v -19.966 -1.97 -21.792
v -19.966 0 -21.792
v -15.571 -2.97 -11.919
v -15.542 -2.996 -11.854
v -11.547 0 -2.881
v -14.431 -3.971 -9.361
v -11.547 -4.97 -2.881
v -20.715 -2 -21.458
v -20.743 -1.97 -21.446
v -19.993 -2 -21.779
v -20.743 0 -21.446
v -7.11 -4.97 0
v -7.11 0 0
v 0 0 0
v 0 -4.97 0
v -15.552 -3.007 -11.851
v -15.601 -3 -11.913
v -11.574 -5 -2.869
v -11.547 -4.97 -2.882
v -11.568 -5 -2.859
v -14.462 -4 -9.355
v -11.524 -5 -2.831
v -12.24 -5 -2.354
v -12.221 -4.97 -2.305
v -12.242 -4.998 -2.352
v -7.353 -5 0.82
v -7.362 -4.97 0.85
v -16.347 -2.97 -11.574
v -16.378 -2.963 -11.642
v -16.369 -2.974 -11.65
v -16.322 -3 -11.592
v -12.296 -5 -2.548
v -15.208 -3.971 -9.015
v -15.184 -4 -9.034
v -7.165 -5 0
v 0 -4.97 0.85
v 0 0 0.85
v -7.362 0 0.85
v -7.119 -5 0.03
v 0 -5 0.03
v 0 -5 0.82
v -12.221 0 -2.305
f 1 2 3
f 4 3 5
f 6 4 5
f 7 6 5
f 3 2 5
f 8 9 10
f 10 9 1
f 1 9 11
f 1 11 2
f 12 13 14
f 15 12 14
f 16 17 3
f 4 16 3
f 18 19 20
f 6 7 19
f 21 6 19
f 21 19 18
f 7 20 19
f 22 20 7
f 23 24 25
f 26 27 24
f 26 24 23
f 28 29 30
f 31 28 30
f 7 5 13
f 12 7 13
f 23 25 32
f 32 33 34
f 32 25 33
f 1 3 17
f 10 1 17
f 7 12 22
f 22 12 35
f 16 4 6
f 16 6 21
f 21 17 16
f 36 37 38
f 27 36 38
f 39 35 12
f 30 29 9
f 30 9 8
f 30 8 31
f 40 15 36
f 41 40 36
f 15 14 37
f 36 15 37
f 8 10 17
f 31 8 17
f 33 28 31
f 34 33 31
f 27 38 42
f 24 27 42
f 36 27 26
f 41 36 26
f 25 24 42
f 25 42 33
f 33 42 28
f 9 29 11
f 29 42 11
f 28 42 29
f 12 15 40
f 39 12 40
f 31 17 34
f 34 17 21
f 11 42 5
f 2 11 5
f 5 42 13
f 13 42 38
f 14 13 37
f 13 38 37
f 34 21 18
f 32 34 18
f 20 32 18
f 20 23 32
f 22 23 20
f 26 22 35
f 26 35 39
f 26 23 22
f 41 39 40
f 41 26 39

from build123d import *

# Parameters (mm, degrees)
F1_DEPTH     = 5
F3_DEPTH     = 25
F4_T1_DEPTH  = 5.9478639207
F4_T6_DEPTH  = 11.0004984696
F4_T11_DEPTH = 3.281815708
F4_T16_DEPTH = 7.2643009793
F4_T21_DEPTH = 5.7529029378
F5_T1_DEPTH  = 7.6329796459
F5_T3_DEPTH  = 7.4610000963
F5_T8_DEPTH  = 7.4842482227
F5_T13_DEPTH = 7.4842482227
F5_T18_DEPTH = 3.281815708
F5_T23_DEPTH = 11.0004984696


# Not quite as in the source:
# - a fillet or chamfer that OpenCascade refuses, or shapes differently, is made with other operations: its cross-section is extruded or revolved along the edge and cut away or added


with BuildPart() as f1:
    # F0 (on Front) → F1 (new body)
    with BuildSketch(Plane.XZ):
        Polygon((-7.11, 0), (0, 0), (0, 0.85), (-7.3617814707, 0.85), (-12.2206721932, -2.3054005297), (-20.7425294551, -21.4458053218), (-19.9660158161, -21.7915314684), (-11.5465673044, -2.8811404952), align=None)
    extrude(amount=F1_DEPTH)

    # F2 (on face) → F3 (cut)
    with BuildSketch(Plane(origin=(-8.5658121179, 0, 3.8137452678), x_dir=(0, 1, 0), z_dir=(0.9135454576, 0, -0.4067366431))):
        Polygon((-4, -14.4284648367), (-5, -7.3284648367), (-5, -28.0284648367), (-2, -28.0284648367), (-3, -17.2284648367), align=None)
    extrude(amount=-F3_DEPTH, mode=Mode.SUBTRACT)

    # F4: chamfer of 0.03 on 5 edges, made by hand

    # F4_s2 → F4_t1 (cut)
    with BuildSketch(Plane(origin=(-4.7250832121, 0, -3.0685049164), x_dir=(0, 1, 0), z_dir=(-0.8386705679, 0, -0.544639035))):
        Polygon((-4.97, -4.722383539), (-5, -4.692383539), (-5, -4.722383539), align=None)
    extrude(amount=F4_T1_DEPTH, mode=Mode.SUBTRACT)


with BuildPart() as f4_tool4:
    # F4_s5 → F4_t6 (new body)
    with BuildSketch(Plane(origin=(-11.2598610976, 2.5632795791, -25.2900620943), x_dir=(0.2219685938, 0.9750538156, 0), z_dir=(0.4050042191, -0.0921982106, 0.9096543698))):
        Polygon((-6.352559346, 8.2598889374), (-6.3880194376, 8.283182325), (-6.3819360855, 8.2538055854), align=None)
    extrude(amount=F4_T6_DEPTH)

    split(bisect_by=Plane(origin=(-0.3055183915, 0.3704168412, 0.2808368777), x_dir=(0.771450463, 0.6362893863, 0), z_dir=(0.549241742, -0.6659120918, -0.5048708694)), keep=Keep.TOP)


with BuildPart() as f1_1:
    add(f1.part)

    # F4_t3: cut F4_tool4
    add(f4_tool4.part, mode=Mode.SUBTRACT)


with BuildPart() as f4_tool9:
    # F4_s10 → F4_t11 (new body)
    with BuildSketch(Plane(origin=(-5.8578101844, 5.1435618144, -13.1568570886), x_dir=(0.659809773, 0.751432674, 0), z_dir=(0.3830409438, -0.336336397, 0.8603240456))):
        Polygon((-12.5057496784, 2.3040031535), (-12.5477702003, 2.3098577021), (-12.5296872137, 2.2859201669), align=None)
    extrude(amount=F4_T11_DEPTH)

    split(bisect_by=Plane(origin=(-2.1159962098, 2.405108563, 1.1858724964), x_dir=(0.7507908153, 0.6605400454, 0), z_dir=(0.6194574075, -0.7040949829, -0.3471639027)), keep=Keep.TOP)


with BuildPart() as f1_2:
    add(f1_1.part)

    # F4_t8: cut F4_tool9
    add(f4_tool9.part, mode=Mode.SUBTRACT)


with BuildPart() as f4_tool14:
    # F4_s15 → F4_t16 (new body)
    with BuildSketch(Plane.YZ.offset(-7.1871504896)):
        Polygon((-4.97, 0), (-5, 0.03), (-5, 0), align=None)
    extrude(amount=F4_T16_DEPTH)

    split(bisect_by=Plane(origin=(0.2989023851, -0.5488082305, -0.4602693104), x_dir=(0.878196468, 0.4783000769, 0), z_dir=(0.385117955, -0.7071067812, -0.5930296458)), keep=Keep.TOP)


with BuildPart() as f1_3:
    add(f1_2.part)

    # F4_t13: cut F4_tool14
    add(f4_tool14.part, mode=Mode.SUBTRACT)


with BuildPart() as f4_tool19:
    # F4_s20 → F4_t21 (new body)
    with BuildSketch(Plane(origin=(-9.7610352954, 0, -6.3388904383), x_dir=(0, 1, 0), z_dir=(0.8386705679, 0, 0.544639035))):
        Polygon((-4.97, 3.872383539), (-5, 3.902383539), (-5, 3.872383539), align=None)
    extrude(amount=F4_T21_DEPTH)

    split(bisect_by=Plane(origin=(-8.5658121179, 0, 3.8137452678), x_dir=(0, 1, 0), z_dir=(0.9135454576, 0, -0.4067366431)), keep=Keep.TOP)

    split(bisect_by=Plane(origin=(0, -2.485, -2.485), x_dir=(1, 0, 0), z_dir=(0, -0.7071067812, -0.7071067812)), keep=Keep.TOP)


with BuildPart() as f1_4:
    add(f1_3.part)

    # F4_t18: cut F4_tool19
    add(f4_tool19.part, mode=Mode.SUBTRACT)

    # F5: chamfer of 0.03 on 5 edges, made by hand

    # F5_s2 → F5_t1 (cut)
    with BuildSketch(Plane(origin=(-5.6229623165, 1.9471236166, -12.6293801411), x_dir=(0.3272176494, 0.9449489986, 0), z_dir=(0.4027614046, -0.1394685218, 0.9046169258))):
        Polygon((-8.7284463039, 7.9822536907), (-8.7481067262, 7.9446575766), (-8.7570745721, 7.9732858448), align=None)
    extrude(amount=F5_T1_DEPTH, mode=Mode.SUBTRACT)

    # F5_s4 → F5_t3 (cut)
    with BuildSketch(Plane.YZ.offset(-7.3838496067)):
        Polygon((-4.97, 0.85), (-5, 0.82), (-5, 0.85), align=None)
    extrude(amount=F5_T3_DEPTH, mode=Mode.SUBTRACT)


with BuildPart() as f5_tool6:
    # F5_s7 → F5_t8 (new body)
    with BuildSketch(Plane(origin=(-5.5630590396, 1.9263802648, -12.4948351783), x_dir=(0.3272176494, 0.9449489986, 0), z_dir=(0.4027614046, -0.1394685218, 0.9046169258))):
        Polygon((-8.4743573363, 7.1711194253), (-8.5119534504, 7.1907798476), (-8.5029856044, 7.1621515794), align=None)
    extrude(amount=F5_T8_DEPTH)

    split(bisect_by=Plane(origin=(0.2989023851, -0.5488082305, -0.4602693104), x_dir=(0.878196468, 0.4783000769, 0), z_dir=(0.385117955, -0.7071067812, -0.5930296458)), keep=Keep.TOP)


with BuildPart() as f1_5:
    add(f1_4.part)

    # F5_t5: cut F5_tool6
    add(f5_tool6.part, mode=Mode.SUBTRACT)


with BuildPart() as f5_tool11:
    # F5_s12 → F5_t13 (new body)
    with BuildSketch(Plane(origin=(-5.5630590396, 1.9263802648, -12.4948351783), x_dir=(0.3272176494, 0.9449489986, 0), z_dir=(0.4027614046, -0.1394685218, 0.9046169258))):
        Polygon((-8.4743573363, 7.1711194253), (-8.5119534504, 7.1907798476), (-8.5029856044, 7.1621515794), align=None)
    extrude(amount=F5_T13_DEPTH)

    split(bisect_by=Plane(origin=(-2.1090512339, 0, 3.2476541019), x_dir=(0, 1, 0), z_dir=(0.544639035, 0, -0.8386705679)), keep=Keep.TOP)


with BuildPart() as f1_6:
    add(f1_5.part)

    # F5_t10: cut F5_tool11
    add(f5_tool11.part, mode=Mode.SUBTRACT)


with BuildPart() as f5_tool16:
    # F5_s17 → F5_t18 (new body)
    with BuildSketch(Plane(origin=(-5.8578101844, 5.1435618144, -13.1568570886), x_dir=(0.659809773, 0.751432674, 0), z_dir=(0.3830409438, -0.336336397, 0.8603240456))):
        Polygon((-13.0181009663, 2.9822333193), (-13.0239555149, 2.9402127974), (-13.0420385015, 2.9641503327), align=None)
    extrude(amount=F5_T18_DEPTH)

    split(bisect_by=Plane(origin=(-7.0244742563, -7.3545925713, 2.3820711564), x_dir=(0.7231501661, -0.6906908406, 0), z_dir=(-0.6724909686, -0.7040949829, 0.2280485743)), keep=Keep.TOP)


with BuildPart() as f1_7:
    add(f1_6.part)

    # F5_t15: cut F5_tool16
    add(f5_tool16.part, mode=Mode.SUBTRACT)


with BuildPart() as f5_tool21:
    # F5_s22 → F5_t23 (new body)
    with BuildSketch(Plane(origin=(-11.2598610976, 2.5632795791, -25.2900620943), x_dir=(0.2219685938, 0.9750538156, 0), z_dir=(0.4050042191, -0.0921982106, 0.9096543698))):
        Polygon((-6.5249209865, 9.0922298921), (-6.548214374, 9.0567698005), (-6.554297726, 9.0861465401), align=None)
    extrude(amount=F5_T23_DEPTH)

    split(bisect_by=Plane(origin=(-9.881776244, -8.860018193, 0.9359011948), x_dir=(0.6675656779, -0.7445509155, 0), z_dir=(-0.742706634, -0.6659120918, 0.0703416075)), keep=Keep.TOP)


with BuildPart() as f1_8:
    add(f1_7.part)

    # F5_t20: cut F5_tool21
    add(f5_tool21.part, mode=Mode.SUBTRACT)


solid = f1_8.part
